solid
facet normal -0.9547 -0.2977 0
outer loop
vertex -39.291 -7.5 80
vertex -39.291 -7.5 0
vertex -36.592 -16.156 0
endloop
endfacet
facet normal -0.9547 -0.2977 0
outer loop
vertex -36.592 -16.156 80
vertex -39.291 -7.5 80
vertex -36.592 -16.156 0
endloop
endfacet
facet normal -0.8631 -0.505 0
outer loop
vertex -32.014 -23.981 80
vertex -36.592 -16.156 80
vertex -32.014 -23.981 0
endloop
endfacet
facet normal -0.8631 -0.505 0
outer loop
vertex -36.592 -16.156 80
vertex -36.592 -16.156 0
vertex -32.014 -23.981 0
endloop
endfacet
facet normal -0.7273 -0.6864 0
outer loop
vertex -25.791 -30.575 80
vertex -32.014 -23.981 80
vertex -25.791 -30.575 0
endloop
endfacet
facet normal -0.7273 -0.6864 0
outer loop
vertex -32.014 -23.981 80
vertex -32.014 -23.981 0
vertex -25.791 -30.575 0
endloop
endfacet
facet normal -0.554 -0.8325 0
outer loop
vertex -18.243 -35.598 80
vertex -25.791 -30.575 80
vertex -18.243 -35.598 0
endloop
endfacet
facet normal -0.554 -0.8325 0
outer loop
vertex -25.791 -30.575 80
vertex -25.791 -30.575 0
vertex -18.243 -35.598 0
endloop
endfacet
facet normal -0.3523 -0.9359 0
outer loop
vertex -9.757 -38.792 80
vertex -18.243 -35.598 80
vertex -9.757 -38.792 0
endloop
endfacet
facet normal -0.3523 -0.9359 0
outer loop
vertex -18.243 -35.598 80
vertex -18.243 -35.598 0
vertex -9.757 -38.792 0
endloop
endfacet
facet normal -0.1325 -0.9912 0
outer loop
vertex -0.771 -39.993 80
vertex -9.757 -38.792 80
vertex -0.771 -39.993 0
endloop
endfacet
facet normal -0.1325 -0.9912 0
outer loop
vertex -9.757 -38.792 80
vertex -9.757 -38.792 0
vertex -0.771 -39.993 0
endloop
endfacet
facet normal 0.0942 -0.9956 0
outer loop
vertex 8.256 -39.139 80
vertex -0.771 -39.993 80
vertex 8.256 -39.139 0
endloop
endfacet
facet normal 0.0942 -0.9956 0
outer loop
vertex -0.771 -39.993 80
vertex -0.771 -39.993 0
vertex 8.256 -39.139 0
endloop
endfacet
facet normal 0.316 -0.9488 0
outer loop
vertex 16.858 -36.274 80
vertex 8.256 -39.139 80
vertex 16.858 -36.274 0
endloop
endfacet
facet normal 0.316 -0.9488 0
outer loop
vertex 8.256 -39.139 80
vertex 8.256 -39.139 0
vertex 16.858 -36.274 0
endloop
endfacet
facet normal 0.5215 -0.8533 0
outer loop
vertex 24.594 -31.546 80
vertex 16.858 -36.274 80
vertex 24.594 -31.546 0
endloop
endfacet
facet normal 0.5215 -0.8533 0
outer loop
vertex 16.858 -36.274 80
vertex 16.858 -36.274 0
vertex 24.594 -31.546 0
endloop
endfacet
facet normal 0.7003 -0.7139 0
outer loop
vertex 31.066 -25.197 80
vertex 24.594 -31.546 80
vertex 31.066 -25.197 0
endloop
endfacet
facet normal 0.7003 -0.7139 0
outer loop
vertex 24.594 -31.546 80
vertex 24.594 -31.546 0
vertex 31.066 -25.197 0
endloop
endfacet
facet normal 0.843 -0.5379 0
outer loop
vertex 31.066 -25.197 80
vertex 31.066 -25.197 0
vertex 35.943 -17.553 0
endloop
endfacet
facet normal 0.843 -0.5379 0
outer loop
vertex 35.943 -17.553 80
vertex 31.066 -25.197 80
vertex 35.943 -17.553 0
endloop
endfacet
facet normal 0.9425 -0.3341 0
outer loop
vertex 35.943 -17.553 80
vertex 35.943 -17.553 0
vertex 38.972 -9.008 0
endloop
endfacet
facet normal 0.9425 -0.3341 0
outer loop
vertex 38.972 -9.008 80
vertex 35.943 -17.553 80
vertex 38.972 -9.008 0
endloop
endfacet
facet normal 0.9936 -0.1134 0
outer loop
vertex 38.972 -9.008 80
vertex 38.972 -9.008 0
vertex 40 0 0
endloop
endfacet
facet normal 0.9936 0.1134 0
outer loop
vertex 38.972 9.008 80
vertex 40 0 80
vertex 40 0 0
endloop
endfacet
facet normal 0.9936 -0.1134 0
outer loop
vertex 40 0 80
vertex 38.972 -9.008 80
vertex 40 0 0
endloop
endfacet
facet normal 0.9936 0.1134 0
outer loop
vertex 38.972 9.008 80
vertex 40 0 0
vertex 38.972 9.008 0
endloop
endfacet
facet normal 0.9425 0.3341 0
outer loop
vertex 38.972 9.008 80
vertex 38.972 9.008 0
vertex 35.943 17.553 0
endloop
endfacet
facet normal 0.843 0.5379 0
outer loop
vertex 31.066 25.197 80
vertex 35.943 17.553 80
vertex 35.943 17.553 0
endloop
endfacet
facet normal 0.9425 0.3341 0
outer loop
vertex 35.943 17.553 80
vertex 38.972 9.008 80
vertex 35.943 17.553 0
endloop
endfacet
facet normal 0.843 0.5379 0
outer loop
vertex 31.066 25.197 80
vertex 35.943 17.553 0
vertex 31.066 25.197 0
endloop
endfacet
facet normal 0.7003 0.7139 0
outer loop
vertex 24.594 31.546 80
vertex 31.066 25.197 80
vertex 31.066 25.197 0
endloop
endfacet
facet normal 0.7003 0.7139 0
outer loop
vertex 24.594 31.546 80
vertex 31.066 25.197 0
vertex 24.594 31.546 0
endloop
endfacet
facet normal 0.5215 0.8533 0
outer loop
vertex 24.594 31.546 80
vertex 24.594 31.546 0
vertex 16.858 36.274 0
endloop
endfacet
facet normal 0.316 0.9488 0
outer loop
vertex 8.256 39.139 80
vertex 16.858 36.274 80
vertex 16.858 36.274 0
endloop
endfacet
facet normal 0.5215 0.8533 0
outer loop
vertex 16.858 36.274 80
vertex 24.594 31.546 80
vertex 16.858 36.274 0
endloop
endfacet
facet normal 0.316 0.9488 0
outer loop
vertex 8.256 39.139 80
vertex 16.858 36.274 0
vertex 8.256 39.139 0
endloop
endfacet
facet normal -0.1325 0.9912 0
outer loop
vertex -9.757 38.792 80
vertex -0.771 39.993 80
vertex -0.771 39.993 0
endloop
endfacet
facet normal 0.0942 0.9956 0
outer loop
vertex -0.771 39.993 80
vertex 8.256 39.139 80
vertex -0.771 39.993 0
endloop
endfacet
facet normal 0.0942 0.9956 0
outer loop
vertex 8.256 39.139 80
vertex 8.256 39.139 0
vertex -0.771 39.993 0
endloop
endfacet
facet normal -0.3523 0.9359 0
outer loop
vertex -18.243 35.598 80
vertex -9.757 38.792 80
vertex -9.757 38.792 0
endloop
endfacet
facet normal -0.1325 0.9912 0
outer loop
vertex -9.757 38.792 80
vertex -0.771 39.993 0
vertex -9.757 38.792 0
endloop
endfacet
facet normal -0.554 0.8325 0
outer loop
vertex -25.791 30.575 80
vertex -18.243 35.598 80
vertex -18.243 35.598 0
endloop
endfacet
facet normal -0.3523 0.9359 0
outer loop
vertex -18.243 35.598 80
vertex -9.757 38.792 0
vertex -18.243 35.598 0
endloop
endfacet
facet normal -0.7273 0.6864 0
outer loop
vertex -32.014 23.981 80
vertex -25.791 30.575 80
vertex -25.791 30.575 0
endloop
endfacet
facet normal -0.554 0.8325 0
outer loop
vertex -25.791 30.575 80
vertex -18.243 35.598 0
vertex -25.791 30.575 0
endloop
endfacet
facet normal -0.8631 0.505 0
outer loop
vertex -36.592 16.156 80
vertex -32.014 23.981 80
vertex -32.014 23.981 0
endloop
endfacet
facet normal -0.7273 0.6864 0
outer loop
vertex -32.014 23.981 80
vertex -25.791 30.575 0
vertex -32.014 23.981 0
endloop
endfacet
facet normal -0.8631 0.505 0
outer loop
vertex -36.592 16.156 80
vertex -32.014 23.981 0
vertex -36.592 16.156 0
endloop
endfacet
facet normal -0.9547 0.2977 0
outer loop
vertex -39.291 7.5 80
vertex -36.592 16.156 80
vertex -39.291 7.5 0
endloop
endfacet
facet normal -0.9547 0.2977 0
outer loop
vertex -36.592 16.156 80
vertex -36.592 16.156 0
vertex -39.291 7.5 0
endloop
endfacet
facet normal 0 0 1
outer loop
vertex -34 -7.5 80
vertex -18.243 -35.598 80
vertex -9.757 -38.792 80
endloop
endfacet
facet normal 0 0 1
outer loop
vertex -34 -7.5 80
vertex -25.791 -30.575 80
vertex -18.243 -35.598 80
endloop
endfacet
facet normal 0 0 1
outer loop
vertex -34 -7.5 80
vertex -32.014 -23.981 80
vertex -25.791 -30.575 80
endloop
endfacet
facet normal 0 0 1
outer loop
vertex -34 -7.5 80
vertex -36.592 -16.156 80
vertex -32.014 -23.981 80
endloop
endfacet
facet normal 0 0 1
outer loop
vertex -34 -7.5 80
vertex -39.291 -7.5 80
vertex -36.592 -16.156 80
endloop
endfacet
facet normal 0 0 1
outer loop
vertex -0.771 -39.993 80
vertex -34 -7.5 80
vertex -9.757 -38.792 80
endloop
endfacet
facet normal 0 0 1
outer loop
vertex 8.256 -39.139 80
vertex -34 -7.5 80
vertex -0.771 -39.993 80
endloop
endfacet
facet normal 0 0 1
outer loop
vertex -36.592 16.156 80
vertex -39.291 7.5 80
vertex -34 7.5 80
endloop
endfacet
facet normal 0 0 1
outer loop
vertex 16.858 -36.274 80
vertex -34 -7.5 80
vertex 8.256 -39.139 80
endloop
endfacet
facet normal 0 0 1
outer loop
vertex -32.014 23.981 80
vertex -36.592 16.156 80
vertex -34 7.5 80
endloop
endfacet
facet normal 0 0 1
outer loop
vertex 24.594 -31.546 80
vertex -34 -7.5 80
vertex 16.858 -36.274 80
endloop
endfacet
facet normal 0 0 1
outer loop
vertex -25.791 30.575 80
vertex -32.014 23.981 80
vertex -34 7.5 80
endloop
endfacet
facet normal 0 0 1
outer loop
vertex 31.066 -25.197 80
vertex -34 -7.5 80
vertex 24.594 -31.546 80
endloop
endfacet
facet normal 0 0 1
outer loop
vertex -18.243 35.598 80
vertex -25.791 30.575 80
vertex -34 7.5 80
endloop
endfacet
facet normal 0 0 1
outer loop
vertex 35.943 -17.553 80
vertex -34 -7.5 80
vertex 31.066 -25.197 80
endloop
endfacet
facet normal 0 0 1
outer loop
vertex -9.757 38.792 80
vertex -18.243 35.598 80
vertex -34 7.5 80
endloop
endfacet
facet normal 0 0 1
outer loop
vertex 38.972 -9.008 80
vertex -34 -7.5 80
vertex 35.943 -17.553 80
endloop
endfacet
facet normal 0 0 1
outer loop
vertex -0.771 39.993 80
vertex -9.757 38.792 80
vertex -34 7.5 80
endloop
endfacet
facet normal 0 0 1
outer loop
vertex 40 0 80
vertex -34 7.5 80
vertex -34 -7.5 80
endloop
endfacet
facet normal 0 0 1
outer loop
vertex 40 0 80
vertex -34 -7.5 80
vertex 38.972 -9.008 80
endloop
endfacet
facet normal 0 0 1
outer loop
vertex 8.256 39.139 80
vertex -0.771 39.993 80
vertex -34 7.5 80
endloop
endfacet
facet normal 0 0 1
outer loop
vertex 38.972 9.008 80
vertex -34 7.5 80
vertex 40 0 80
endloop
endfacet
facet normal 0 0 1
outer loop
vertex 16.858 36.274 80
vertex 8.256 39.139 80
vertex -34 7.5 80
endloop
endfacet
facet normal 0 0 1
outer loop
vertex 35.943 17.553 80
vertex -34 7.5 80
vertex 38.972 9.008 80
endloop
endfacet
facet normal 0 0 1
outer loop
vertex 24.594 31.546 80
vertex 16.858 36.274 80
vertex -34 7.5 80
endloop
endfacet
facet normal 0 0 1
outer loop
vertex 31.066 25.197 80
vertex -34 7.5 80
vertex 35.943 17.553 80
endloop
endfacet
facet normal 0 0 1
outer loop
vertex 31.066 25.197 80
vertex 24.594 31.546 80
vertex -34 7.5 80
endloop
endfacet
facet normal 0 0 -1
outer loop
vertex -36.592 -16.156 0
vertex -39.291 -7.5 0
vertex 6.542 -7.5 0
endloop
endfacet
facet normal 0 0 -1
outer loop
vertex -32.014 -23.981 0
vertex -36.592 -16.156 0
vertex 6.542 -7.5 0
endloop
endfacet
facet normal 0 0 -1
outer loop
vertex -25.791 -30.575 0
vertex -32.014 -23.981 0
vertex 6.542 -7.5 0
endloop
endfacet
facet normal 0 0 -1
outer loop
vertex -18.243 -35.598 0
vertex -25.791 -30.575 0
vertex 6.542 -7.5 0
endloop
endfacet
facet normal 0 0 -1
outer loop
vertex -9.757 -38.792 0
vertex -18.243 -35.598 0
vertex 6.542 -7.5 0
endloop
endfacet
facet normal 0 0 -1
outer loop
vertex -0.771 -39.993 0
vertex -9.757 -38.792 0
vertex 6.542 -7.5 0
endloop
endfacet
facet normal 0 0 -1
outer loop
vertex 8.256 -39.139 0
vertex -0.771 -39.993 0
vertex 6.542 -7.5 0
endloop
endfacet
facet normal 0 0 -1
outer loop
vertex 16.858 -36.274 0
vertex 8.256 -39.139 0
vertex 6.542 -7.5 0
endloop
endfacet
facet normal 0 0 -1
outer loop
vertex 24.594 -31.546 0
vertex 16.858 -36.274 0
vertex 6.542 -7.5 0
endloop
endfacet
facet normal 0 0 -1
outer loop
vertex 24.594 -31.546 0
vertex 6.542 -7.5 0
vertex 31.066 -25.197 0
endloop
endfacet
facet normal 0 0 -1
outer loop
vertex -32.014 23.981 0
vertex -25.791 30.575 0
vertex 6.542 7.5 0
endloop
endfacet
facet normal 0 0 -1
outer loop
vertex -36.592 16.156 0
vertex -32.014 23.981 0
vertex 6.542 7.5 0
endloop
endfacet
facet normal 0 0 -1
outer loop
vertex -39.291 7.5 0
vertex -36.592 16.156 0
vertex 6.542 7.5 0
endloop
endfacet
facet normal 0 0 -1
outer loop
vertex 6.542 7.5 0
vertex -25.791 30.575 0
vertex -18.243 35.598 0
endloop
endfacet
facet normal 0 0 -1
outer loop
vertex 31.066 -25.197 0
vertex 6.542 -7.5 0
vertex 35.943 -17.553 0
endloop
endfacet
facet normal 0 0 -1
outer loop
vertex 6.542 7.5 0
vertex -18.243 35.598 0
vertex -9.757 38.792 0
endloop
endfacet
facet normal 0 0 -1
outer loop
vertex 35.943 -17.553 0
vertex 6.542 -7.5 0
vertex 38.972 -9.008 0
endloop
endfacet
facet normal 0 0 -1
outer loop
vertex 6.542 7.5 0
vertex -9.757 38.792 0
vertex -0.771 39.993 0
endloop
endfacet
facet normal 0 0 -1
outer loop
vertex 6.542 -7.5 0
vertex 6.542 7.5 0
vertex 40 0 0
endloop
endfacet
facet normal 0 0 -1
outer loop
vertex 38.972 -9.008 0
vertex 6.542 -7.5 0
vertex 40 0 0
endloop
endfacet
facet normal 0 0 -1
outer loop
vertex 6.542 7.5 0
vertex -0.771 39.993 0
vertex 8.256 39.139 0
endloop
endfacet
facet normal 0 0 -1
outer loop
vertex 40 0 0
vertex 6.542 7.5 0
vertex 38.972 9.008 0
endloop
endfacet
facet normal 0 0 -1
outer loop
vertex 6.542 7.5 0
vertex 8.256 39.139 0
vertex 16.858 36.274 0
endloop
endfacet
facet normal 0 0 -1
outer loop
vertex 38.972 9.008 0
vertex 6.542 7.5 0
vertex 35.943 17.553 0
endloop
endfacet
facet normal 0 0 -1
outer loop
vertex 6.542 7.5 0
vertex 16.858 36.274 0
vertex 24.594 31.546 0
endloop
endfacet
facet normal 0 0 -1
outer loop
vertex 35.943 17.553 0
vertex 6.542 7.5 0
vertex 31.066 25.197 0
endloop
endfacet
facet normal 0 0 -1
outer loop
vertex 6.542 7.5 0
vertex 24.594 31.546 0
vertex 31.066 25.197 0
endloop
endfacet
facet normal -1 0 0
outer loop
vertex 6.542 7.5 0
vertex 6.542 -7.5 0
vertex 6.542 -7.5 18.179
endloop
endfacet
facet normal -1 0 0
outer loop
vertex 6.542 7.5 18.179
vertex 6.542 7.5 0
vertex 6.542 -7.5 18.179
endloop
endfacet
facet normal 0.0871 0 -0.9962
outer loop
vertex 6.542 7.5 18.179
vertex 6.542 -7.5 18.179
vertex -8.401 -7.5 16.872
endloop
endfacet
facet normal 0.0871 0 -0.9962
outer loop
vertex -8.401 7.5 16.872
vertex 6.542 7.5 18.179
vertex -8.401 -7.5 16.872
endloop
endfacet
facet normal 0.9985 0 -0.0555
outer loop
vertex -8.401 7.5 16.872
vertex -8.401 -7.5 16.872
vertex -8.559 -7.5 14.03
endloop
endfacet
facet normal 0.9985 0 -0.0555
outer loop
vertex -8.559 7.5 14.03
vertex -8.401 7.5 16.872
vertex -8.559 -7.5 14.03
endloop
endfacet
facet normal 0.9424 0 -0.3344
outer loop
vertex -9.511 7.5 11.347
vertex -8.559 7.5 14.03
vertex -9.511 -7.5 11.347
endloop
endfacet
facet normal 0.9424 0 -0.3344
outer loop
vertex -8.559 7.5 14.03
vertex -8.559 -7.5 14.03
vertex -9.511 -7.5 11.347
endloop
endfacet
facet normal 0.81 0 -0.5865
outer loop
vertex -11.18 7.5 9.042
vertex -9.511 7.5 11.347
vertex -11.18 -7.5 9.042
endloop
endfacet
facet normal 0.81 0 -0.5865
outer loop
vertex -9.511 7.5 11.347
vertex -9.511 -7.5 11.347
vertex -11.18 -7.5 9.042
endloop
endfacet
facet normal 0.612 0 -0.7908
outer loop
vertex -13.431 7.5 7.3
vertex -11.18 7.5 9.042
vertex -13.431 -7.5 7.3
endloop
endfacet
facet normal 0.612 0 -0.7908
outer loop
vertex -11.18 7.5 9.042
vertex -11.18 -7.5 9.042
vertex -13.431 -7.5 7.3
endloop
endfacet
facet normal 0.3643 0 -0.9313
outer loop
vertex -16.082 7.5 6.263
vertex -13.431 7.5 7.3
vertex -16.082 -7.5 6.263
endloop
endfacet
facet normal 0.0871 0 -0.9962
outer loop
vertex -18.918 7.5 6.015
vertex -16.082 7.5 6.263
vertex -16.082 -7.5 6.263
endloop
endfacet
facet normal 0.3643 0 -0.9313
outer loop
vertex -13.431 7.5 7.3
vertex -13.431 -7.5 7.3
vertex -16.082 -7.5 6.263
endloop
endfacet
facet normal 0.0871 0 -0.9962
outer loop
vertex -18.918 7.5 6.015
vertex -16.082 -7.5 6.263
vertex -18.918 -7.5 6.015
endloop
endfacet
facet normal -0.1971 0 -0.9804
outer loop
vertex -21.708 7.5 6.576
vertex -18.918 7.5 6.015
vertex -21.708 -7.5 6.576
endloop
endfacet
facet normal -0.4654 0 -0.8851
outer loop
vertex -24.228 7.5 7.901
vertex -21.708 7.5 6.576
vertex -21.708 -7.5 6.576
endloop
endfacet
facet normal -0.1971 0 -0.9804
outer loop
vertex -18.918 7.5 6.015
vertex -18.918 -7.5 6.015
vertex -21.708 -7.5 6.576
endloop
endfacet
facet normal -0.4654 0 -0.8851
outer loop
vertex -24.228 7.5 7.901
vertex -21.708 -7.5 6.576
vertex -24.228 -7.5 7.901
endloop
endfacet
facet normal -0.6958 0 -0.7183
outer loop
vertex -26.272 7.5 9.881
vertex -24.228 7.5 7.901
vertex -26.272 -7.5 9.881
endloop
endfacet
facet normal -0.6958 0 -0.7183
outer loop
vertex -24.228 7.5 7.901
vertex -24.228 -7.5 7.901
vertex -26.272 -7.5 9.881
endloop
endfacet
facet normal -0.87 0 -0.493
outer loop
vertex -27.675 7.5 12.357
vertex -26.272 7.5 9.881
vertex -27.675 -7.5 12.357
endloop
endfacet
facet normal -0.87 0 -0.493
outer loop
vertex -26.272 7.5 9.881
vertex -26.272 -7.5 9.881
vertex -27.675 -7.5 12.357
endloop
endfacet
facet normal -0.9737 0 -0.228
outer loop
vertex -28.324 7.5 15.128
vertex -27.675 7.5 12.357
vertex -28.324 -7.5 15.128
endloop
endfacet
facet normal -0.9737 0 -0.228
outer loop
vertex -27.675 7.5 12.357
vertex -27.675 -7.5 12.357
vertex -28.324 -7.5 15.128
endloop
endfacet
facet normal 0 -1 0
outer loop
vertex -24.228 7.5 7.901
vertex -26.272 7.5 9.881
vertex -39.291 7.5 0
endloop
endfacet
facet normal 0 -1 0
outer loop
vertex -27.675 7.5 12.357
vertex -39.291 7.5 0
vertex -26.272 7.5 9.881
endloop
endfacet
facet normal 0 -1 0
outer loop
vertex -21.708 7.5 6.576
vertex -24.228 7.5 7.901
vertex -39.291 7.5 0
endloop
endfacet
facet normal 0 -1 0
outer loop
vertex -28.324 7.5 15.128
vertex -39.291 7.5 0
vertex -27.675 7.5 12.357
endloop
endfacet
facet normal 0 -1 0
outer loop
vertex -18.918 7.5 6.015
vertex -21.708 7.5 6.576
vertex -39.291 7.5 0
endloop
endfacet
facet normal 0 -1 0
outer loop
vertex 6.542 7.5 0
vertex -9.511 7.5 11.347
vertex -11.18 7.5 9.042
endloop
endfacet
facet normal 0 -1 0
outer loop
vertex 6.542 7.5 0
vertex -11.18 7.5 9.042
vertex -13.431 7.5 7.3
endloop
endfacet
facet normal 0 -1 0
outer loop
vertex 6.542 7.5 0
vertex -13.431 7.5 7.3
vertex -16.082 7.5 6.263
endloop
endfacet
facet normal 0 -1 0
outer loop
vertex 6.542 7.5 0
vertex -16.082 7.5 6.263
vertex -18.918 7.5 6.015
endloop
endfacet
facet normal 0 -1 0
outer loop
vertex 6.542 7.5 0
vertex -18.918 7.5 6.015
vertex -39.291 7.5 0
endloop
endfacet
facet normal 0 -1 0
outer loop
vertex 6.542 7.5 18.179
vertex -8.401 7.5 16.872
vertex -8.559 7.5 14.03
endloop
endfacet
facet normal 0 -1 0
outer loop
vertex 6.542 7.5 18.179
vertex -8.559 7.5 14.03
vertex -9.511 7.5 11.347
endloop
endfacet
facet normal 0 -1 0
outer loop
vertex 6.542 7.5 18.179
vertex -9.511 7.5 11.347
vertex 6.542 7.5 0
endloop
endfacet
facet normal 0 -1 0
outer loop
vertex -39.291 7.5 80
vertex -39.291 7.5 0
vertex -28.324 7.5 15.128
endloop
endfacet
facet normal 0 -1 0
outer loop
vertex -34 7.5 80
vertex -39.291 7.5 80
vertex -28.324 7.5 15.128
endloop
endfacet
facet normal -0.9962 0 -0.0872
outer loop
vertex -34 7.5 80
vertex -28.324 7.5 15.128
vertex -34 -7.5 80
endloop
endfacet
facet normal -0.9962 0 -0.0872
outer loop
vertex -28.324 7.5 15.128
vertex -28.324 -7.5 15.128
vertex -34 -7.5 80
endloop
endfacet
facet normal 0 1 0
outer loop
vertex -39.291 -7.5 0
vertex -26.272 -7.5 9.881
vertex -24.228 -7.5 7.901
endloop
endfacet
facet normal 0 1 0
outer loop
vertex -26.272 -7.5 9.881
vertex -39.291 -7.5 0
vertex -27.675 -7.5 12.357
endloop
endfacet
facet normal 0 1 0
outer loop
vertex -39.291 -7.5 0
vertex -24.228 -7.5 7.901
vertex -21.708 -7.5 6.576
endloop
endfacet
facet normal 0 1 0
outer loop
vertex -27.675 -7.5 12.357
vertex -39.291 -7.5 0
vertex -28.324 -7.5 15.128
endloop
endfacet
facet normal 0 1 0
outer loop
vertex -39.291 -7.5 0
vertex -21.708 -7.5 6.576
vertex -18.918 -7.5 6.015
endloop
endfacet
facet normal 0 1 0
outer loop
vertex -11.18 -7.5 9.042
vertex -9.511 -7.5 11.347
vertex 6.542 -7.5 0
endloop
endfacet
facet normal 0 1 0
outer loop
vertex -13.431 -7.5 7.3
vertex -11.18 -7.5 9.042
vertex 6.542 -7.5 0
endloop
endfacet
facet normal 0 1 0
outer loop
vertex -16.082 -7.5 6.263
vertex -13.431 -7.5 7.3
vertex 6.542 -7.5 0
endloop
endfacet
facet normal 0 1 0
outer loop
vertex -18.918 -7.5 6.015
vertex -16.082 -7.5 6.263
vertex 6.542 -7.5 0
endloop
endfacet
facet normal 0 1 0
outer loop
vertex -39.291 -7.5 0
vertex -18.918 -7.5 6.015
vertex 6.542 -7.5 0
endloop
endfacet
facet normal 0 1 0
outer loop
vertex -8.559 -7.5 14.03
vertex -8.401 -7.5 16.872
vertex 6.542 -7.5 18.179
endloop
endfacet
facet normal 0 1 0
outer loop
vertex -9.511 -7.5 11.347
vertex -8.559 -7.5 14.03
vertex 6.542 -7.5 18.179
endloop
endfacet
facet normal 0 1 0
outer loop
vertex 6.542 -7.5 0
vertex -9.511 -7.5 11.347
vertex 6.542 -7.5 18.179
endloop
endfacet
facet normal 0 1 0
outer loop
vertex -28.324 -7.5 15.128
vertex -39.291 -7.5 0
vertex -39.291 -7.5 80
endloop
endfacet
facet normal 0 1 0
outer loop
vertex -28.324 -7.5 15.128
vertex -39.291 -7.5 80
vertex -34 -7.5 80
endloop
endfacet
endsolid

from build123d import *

# Parameters (mm, degrees)
F0_R     = 40
F1_DEPTH = 80
F3_DEPTH = 7.5


with BuildPart() as f1:
    # F0 (on Top) → F1 (new body)
    with BuildSketch(Plane.XY):
        Circle(F0_R)
    extrude(amount=F1_DEPTH)

    # F2 (on Front) → F3 (cut, symmetric)
    with BuildSketch(Plane.XZ):
        with BuildLine():
            Line((-40, 80), (-40, 0))
            Line((-40, 0), (6.54234, 0))
            Line((6.54234, 0), (6.54234, 18.178894))
            Line((6.54234, 18.178894), (-8.40058, 16.871557))
            ThreePointArc((-8.40058, 16.871557), (-17.49097, 6.038053), (-28.324474, 15.128443))
            Line((-28.324474, 15.128443), (-34, 80))
            Line((-34, 80), (-40, 80))
        make_face()
    extrude(amount=F3_DEPTH, both=True, mode=Mode.SUBTRACT)


solid = f1.part
